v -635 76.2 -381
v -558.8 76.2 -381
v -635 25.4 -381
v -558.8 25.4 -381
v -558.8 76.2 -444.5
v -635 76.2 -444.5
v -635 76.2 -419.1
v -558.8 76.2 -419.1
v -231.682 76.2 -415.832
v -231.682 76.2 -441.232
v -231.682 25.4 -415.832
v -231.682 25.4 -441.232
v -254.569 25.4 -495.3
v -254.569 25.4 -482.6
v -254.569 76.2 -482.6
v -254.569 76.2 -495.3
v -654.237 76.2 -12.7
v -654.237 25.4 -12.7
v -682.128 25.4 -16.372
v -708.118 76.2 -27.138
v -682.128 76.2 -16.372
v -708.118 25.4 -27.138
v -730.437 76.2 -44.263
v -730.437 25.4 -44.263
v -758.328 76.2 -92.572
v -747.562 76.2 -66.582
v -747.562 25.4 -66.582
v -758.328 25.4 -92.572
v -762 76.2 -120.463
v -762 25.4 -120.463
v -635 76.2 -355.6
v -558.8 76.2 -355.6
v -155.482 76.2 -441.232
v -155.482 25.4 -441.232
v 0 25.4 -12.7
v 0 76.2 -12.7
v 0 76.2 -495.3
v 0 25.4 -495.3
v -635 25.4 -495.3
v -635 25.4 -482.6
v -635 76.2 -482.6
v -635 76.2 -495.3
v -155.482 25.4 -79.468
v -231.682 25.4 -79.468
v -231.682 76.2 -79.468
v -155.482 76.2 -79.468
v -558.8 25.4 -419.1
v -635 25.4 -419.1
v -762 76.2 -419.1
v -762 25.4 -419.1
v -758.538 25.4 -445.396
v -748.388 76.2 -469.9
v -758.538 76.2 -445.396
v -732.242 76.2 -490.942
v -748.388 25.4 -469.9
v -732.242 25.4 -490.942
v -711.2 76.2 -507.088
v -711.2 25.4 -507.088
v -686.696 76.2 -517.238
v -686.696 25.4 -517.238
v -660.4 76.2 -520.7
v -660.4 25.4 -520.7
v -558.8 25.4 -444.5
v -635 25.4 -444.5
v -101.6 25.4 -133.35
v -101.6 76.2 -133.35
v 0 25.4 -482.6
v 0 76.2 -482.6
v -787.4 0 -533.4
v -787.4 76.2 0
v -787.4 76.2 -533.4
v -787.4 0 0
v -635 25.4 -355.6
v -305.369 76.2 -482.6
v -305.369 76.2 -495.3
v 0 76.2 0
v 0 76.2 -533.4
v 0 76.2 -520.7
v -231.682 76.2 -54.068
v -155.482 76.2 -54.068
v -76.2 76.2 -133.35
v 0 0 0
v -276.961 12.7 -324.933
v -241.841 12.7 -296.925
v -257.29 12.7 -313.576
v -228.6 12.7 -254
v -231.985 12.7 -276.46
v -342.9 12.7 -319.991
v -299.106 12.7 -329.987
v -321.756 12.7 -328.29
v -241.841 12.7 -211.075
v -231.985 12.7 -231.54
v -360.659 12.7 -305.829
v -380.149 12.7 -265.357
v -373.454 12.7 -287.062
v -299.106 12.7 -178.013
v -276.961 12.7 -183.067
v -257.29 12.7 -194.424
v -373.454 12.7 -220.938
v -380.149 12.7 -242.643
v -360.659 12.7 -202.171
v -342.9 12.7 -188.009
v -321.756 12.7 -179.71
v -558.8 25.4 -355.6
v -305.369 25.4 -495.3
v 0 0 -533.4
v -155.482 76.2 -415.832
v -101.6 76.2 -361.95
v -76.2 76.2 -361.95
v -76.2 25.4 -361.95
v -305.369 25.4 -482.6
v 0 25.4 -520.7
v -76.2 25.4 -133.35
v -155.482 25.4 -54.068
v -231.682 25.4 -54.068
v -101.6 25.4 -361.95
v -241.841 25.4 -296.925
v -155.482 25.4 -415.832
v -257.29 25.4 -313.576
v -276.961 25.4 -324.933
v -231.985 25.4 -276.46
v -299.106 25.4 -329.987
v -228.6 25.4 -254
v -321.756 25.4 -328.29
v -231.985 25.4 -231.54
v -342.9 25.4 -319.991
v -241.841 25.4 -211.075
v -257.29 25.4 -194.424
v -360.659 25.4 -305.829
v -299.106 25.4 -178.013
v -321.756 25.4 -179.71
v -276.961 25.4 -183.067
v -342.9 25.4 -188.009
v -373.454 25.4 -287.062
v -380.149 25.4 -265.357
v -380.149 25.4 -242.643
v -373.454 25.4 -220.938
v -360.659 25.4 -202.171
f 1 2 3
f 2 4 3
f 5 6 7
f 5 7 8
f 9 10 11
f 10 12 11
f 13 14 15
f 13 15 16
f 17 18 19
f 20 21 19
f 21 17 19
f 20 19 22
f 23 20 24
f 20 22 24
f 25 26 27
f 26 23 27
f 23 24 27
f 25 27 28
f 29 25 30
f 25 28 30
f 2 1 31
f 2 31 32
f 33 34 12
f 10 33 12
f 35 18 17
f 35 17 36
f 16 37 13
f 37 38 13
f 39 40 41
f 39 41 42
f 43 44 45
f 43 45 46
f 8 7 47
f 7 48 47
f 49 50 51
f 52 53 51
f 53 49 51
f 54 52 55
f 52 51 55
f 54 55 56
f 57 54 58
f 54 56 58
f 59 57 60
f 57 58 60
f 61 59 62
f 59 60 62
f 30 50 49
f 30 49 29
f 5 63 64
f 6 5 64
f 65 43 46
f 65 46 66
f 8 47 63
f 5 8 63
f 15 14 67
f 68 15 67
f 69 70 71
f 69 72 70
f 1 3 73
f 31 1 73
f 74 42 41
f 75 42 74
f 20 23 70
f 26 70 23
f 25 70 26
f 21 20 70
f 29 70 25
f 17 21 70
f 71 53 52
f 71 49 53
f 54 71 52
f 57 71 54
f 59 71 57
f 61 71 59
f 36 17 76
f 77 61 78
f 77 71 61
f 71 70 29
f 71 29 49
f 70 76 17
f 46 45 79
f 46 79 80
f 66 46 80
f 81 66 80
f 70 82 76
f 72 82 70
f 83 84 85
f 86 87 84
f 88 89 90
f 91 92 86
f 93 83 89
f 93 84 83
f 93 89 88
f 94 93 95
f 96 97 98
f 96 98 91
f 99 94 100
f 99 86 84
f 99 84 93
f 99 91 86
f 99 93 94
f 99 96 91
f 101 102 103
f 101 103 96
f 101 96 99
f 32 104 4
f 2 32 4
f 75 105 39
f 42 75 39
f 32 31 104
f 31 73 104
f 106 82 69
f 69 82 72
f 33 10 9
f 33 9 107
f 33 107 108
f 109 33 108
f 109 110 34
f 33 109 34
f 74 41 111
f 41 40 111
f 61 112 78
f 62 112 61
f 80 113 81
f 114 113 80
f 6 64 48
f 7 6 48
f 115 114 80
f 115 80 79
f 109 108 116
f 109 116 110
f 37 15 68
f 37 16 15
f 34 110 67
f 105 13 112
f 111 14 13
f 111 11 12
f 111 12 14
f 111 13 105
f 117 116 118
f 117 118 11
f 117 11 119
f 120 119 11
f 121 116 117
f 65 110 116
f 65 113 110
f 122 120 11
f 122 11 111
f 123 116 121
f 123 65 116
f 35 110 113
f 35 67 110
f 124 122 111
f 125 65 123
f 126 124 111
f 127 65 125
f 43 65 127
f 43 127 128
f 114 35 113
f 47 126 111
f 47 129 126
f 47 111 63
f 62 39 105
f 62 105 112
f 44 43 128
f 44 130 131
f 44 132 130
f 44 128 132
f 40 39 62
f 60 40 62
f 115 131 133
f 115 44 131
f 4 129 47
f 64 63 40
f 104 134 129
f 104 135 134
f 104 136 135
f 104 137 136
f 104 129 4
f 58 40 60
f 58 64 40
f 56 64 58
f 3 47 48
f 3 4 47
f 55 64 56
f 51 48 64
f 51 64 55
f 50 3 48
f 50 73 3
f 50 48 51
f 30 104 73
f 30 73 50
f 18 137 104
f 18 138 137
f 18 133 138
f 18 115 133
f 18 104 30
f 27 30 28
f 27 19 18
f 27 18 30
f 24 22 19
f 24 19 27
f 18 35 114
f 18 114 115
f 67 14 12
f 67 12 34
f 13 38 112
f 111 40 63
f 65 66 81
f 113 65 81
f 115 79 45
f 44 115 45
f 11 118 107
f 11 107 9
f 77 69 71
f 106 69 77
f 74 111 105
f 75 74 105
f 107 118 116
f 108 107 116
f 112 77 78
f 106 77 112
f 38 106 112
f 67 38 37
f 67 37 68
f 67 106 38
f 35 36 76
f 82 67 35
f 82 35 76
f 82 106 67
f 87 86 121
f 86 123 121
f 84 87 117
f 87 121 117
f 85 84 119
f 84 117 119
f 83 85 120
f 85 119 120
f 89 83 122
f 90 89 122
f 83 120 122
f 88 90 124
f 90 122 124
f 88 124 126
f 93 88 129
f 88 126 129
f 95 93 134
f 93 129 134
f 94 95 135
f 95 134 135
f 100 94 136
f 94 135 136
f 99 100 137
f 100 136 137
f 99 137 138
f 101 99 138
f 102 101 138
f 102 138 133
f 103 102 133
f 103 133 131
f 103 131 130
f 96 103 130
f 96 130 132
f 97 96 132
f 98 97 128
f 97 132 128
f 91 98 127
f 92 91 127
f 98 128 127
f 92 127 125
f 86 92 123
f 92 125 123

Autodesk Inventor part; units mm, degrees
ref_plane "YZ Plane" through (0, 0, 0) normal (1, 0, 0) x (0, 1, 0)
ref_plane "XZ Plane" through (0, 0, 0) normal (0, 1, 0) x (-1, 0, 0)
ref_plane "XY Plane" through (0, 0, 0) normal (0, 0, 1) x (1, 0, 0)
sketch "Sketch1" plane through (0, 0, 0) normal (0, 1, 0) x (-1, 0, 0)
  line L0 (0, 0) -> (787.4, 0)
  line L1 (787.4, 0) -> (787.4, -533.4)
  line L2 (787.4, -533.4) -> (0, -533.4)
  line L3 (0, -533.4) -> (0, 0)
  dimension "d0" = 787.4
  dimension "d1" = 533.4
extrude "Extrusion1" add sketch "Sketch1" along normal blind 25.4
sketch "Sketch2" plane through (0, 25.4, 0) normal (0, 1, 0) x (1, 0, 0)
  line L0 (-787.4, 0) -> (0, 0) projected
  line L1 (-787.4, 533.4) -> (-787.4, 0) projected
  line L2 (0, 0) -> (-787.4, 0)
  line L3 (-787.4, 0) -> (-787.4, 12.7)
  line L4 (-787.4, 12.7) -> (0, 12.7)
  line L5 (0, 12.7) -> (0, 0)
  line L6 (0, 533.4) -> (-787.4, 533.4) projected
  line L7 (0, 0) -> (0, 533.4) projected
  line L8 (-787.4, 533.4) -> (0, 533.4)
  line L9 (0, 533.4) -> (0, 520.7)
  line L10 (0, 520.7) -> (-787.4, 520.7)
  line L11 (-787.4, 520.7) -> (-787.4, 533.4)
  line L12 (-787.4, 533.4) -> (-762, 533.4)
  line L13 (-762, 533.4) -> (-762, 0)
  line L14 (-762, 0) -> (-787.4, 0)
  line L15 (-787.4, 0) -> (-787.4, 533.4)
  dimension "d4" = 12.7
  dimension "d5" = 12.7
  dimension "d6" = 25.4
extrude "Extrusion2" add sketch "Sketch2" along normal blind 50.8 contours L1 L4 L13 L0 | L13 L4 L5 L0 | L1 L10 L13 L4 | L1 L6 L13 L10 | L13 L6 L7 L10
sketch "Sketch3" plane through (0, 25.4, 0) normal (0, 1, 0) x (1, 0, 0)
  line L0 (0, 533.4) -> (-787.4, 533.4) construction
  line L1 (0, 533.4) -> (0, 520.7) construction
  line L2 (0, 533.4) -> (0, 0) construction
  line L3 (0, 12.7) -> (0, 520.7) construction
  line L4 (0, 520.7) -> (0, 495.3) construction
  line L5 (-762, 520.7) -> (-762, 12.7) construction
  line L6 (-762, 520.7) -> (-762, 495.3) construction
  line L7 (0, 520.7) -> (-762, 520.7) construction
  line L8 (-762, 520.7) -> (-762, 419.1) construction
  line L9 (-762, 520.7) -> (-660.4, 520.7) construction
  arc A0 (-660.4, 520.7) -> (-762, 419.1) centre (-660.4, 419.1) ccw construction
  line L10 (0, 495.3) -> (-660.4, 495.3)
  line L11 (-660.4, 495.3) -> (-660.4, 482.6)
  line L12 (-660.4, 482.6) -> (0, 482.6)
  line L13 (0, 482.6) -> (0, 495.3)
  arc A1 (-660.4, 520.7) -> (-762, 419.1) centre (-660.4, 419.1) ccw
  line L14 (-762, 419.1) -> (-762, 520.7)
  line L15 (-762, 520.7) -> (-660.4, 520.7)
  dimension "d9" = 12.7
  dimension "d10" = 25.4
  dimension "d11" = 25.4
  dimension "d12" = 101.6
  dimension "d13" = 101.6
  dimension "d14" = 12.7
extrude "Extrusion3" add sketch "Sketch3" along normal blind 50.8
sketch "Sketch4" plane through (0, 25.4, 0) normal (0, 1, 0) x (1, 0, 0)
  line L0 (0, 12.7) -> (-762, 12.7) construction
  line L1 (-762, 12.7) -> (-654.2369, 120.4631) construction
  line L2 (-762, 12.7) -> (-609.6, 12.7) construction
  line L3 (-762, 419.1) -> (-762, 12.7) projected
  arc A0 (-762, 120.4631) -> (-654.2369, 12.7) centre (-654.2369, 120.4631) ccw
  line L4 (-654.2369, 12.7) -> (-762, 12.7)
  line L5 (-762, 120.4631) -> (-762, 12.7)
  point P0 (0, 0)
  dimension "d18" = 152.4
  dimension "d19" = 45
extrude "Extrusion4" add sketch "Sketch4" along normal blind 50.8
sketch "Sketch6" plane through (0, 76.2, 0) normal (0, 1, 0) x (1, 0, 0)
  line L0 (-660.4, 482.6) -> (0, 482.6) projected
  line L1 (-254.5688, 482.6) -> (-254.5688, 495.3)
  line L2 (0, 495.3) -> (-660.4, 495.3) projected
  line L3 (-254.5688, 482.6) -> (-305.3688, 482.6)
  line L4 (-305.3688, 482.6) -> (-305.3688, 495.3)
  line L5 (-305.3688, 495.3) -> (-254.5688, 495.3)
  point P0 (0, 0)
  dimension "d22" = 50.8
extrude "Extrusion5" cut sketch "Sketch6" against normal blind 50.8
sketch "Sketch8" plane through (0, 76.2, 0) normal (0, 1, 0) x (1, 0, 0)
  line L0 (-305.3688, 482.6) -> (-660.4, 482.6) projected
  line L1 (-660.4, 482.6) -> (-635, 482.6)
  line L2 (-635, 482.6) -> (-635, 495.3)
  line L3 (-305.3688, 495.3) -> (-660.4, 495.3) projected
  line L4 (-660.4, 495.3) -> (-635, 495.3)
  line L5 (-660.4, 482.6) -> (-660.4, 495.3) projected
  line L6 (-660.4, 482.6) -> (-660.4, 495.3)
  point P0 (0, 0)
  dimension "d26" = 25.4
extrude "Extrusion6" cut sketch "Sketch8" against normal blind 50.8
sketch "Sketch7" plane through (0, 25.4, 0) normal (0, 1, 0) x (1, 0, 0)
  line L0 (-254.5688, 495.3) -> (-279.9688, 520.7) construction
  line L1 (0, 520.7) -> (-660.4, 520.7) construction
  line L2 (-254.5688, 495.3) -> (-218.6478, 495.3) construction
  point P0 (0, 0)
  dimension "d25" = 135
sketch "Sketch9" plane through (0, 25.4, 0) normal (0, 1, 0) x (1, 0, 0)
  line L0 (0, 520.7) -> (-660.4, 520.7) construction
  line L1 (-635, 495.3) -> (-305.3688, 495.3) construction
  line L2 (-660.4, 520.7) -> (-635, 495.3) construction
  point P0 (0, 0)
sketch "Sketch10" plane through (0, 25.4, 0) normal (0, 1, 0) x (1, 0, 0)
  line L0 (-635, 482.6) -> (-305.3688, 482.6) construction
  line L1 (-635, 482.6) -> (-635, 444.5) construction
  line L2 (-635, 444.5) -> (-635, 419.1) construction
  line L3 (-635, 419.1) -> (-635, 381) construction
  line L4 (-635, 381) -> (-635, 355.6) construction
  line L5 (-635, 355.6) -> (-558.8, 355.6)
  line L6 (-558.8, 355.6) -> (-558.8, 381)
  line L7 (-558.8, 381) -> (-635, 381)
  line L8 (-635, 381) -> (-635, 355.6)
  line L9 (-635, 419.1) -> (-558.8, 419.1)
  line L10 (-558.8, 419.1) -> (-558.8, 444.5)
  line L11 (-558.8, 444.5) -> (-635, 444.5)
  line L12 (-635, 444.5) -> (-635, 419.1)
  point P0 (0, 0)
  dimension "d29" = 38.1
  dimension "d30" = 25.4
  dimension "d31" = 38.1
  dimension "d32" = 25.4
  dimension "d33" = 76.2
extrude "Extrusion7" add sketch "Sketch10" along normal blind 50.8
sketch "Sketch11" plane through (0, 25.4, 0) normal (0, 1, 0) x (1, 0, 0)
  line L0 (0, 12.7) -> (0, 247.65) construction
  line L1 (0, 247.65) -> (-101.6, 247.65) construction
  line L2 (-101.6, 247.65) -> (-101.6, 209.55) construction
  line L3 (-101.6, 209.55) -> (-101.6, 133.35) construction
  line L4 (-101.6, 133.35) -> (-155.4815, 79.4685) construction
  line L5 (-155.4815, 79.4685) -> (-231.6815, 79.4685) construction
  line L6 (-101.6, 247.65) -> (-101.6, 361.95) construction
  line L7 (-101.6, 361.95) -> (-155.4815, 415.8315) construction
  line L8 (-155.4815, 415.8315) -> (-231.6815, 415.8315) construction
  line L9 (-155.4815, 79.4685) -> (-101.6, 133.35)
  line L10 (-101.6, 133.35) -> (-76.2, 133.35)
  line L11 (-76.2, 133.35) -> (-155.4815, 54.0685)
  line L12 (-155.4815, 54.0685) -> (-231.6815, 54.0685)
  line L13 (-231.6815, 54.0685) -> (-231.6815, 79.4685)
  line L14 (-231.6815, 79.4685) -> (-155.4815, 79.4685)
  line L15 (-101.6, 361.95) -> (-76.2, 361.95)
  line L16 (-76.2, 361.95) -> (-155.4815, 441.2315)
  line L17 (-155.4815, 441.2315) -> (-231.6815, 441.2315)
  line L18 (-231.6815, 441.2315) -> (-231.6815, 415.8315)
  line L19 (-155.4815, 415.8315) -> (-231.6815, 415.8315)
  line L20 (-155.4815, 415.8315) -> (-101.6, 361.95)
  point P0 (0, 0)
  dimension "d36" = 234.95
  dimension "d37" = 101.6
  dimension "d38" = 38.1
  dimension "d39" = 76.2
  dimension "d40" = 76.2
  dimension "d41" = 135
  dimension "d42" = 76.2
  dimension "d43" = 114.3
  dimension "d44" = 76.2
  dimension "d45" = 135
  dimension "d46" = 25.4
extrude "Extrusion8" add sketch "Sketch11" along normal blind 50.8
sketch "Sketch12" plane through (0, 25.4, 0) normal (0, 1, 0) x (1, 0, 0)
  line L0 (0, 12.7) -> (0, 482.6) construction
  line L1 (0, 12.7) -> (0, 254) construction
  line L2 (0, 254) -> (-304.8, 254) construction
  circle A0 centre (-304.8, 254) radius 76.2
  point P0 (0, 0)
  dimension "d49" = 241.3
  dimension "d50" = 304.8
  dimension "d51" = 152.4
emboss "Emboss1" sketch "Sketch12" operation cut depth 12.7 direction (0, -1, 0)
properties part number "Playfield"
